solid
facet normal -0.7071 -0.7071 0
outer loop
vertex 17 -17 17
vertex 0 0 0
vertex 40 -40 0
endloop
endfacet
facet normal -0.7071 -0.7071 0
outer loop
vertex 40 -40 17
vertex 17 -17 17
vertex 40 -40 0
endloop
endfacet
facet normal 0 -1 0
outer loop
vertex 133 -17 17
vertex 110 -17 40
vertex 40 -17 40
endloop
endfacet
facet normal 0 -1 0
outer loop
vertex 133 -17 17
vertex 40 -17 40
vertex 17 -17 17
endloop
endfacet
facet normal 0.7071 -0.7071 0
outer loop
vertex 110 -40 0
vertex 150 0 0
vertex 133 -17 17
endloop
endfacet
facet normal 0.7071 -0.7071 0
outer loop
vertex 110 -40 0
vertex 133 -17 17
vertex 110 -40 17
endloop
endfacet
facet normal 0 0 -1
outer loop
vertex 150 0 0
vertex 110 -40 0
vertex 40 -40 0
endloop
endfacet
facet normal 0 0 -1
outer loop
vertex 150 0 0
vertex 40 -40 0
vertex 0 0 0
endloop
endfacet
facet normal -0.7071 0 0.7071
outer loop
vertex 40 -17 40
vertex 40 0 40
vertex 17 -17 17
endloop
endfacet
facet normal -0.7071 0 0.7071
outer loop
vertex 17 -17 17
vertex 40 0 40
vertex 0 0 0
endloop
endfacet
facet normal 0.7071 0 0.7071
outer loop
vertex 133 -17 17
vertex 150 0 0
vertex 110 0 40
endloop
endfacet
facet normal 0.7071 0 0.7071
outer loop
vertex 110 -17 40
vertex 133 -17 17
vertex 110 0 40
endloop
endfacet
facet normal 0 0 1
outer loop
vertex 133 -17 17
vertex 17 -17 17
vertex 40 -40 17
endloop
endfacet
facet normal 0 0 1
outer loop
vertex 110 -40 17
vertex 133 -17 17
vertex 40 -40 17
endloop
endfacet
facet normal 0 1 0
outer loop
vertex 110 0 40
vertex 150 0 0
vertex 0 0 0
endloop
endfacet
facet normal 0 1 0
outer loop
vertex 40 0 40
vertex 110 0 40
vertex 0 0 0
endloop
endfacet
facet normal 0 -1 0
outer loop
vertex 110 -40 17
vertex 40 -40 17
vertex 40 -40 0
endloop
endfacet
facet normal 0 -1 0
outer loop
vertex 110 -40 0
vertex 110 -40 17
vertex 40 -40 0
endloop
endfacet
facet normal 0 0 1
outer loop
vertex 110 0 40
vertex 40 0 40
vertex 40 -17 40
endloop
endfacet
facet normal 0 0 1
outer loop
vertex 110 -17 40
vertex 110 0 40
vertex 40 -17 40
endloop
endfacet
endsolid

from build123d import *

# Parameters (mm, degrees)
BOSS_EXTRU_1_DEPTH      = 150
ENL_V_MAT_EXTRU_1_DEPTH = 41
ENL_V_MAT_EXTRU_2_DEPTH = 41


with BuildPart() as part:
    # Esquisse1 → Boss.-Extru.1 (new body)
    with BuildSketch(Plane(origin=(0, 0, 0), x_dir=(0, 0, -1), z_dir=(1, 0, 0))):
        Polygon((0, 0), (-40, 0), (-40, -17), (-17, -17), (-17, -40), (0, -40), align=None)
    extrude(amount=BOSS_EXTRU_1_DEPTH)

    # Esquisse2 → Enlèv. mat.-Extru.1 (cut, through all)
    with BuildSketch(Plane(origin=(0, 0, 0), x_dir=(1, 0, 0), z_dir=(0, 1, 0))):
        Polygon((150, 0), (110, -40), (150, -40), align=None)
        Polygon((0, 0), (0, -40), (40, -40), align=None)
    extrude(amount=-ENL_V_MAT_EXTRU_1_DEPTH, mode=Mode.SUBTRACT)

    # Esquisse3 → Enlèv. mat.-Extru.2 (cut, through all)
    with BuildSketch(Plane(origin=(0, 0, 0), x_dir=(-1, 0, 0), z_dir=(0, 0, -1))):
        Polygon((-150, 0), (-110, -40), (-150, -40), align=None)
        Polygon((-40, -40), (0, -40), (0, 0), align=None)
    extrude(amount=-ENL_V_MAT_EXTRU_2_DEPTH, mode=Mode.SUBTRACT)


solid = part.part
